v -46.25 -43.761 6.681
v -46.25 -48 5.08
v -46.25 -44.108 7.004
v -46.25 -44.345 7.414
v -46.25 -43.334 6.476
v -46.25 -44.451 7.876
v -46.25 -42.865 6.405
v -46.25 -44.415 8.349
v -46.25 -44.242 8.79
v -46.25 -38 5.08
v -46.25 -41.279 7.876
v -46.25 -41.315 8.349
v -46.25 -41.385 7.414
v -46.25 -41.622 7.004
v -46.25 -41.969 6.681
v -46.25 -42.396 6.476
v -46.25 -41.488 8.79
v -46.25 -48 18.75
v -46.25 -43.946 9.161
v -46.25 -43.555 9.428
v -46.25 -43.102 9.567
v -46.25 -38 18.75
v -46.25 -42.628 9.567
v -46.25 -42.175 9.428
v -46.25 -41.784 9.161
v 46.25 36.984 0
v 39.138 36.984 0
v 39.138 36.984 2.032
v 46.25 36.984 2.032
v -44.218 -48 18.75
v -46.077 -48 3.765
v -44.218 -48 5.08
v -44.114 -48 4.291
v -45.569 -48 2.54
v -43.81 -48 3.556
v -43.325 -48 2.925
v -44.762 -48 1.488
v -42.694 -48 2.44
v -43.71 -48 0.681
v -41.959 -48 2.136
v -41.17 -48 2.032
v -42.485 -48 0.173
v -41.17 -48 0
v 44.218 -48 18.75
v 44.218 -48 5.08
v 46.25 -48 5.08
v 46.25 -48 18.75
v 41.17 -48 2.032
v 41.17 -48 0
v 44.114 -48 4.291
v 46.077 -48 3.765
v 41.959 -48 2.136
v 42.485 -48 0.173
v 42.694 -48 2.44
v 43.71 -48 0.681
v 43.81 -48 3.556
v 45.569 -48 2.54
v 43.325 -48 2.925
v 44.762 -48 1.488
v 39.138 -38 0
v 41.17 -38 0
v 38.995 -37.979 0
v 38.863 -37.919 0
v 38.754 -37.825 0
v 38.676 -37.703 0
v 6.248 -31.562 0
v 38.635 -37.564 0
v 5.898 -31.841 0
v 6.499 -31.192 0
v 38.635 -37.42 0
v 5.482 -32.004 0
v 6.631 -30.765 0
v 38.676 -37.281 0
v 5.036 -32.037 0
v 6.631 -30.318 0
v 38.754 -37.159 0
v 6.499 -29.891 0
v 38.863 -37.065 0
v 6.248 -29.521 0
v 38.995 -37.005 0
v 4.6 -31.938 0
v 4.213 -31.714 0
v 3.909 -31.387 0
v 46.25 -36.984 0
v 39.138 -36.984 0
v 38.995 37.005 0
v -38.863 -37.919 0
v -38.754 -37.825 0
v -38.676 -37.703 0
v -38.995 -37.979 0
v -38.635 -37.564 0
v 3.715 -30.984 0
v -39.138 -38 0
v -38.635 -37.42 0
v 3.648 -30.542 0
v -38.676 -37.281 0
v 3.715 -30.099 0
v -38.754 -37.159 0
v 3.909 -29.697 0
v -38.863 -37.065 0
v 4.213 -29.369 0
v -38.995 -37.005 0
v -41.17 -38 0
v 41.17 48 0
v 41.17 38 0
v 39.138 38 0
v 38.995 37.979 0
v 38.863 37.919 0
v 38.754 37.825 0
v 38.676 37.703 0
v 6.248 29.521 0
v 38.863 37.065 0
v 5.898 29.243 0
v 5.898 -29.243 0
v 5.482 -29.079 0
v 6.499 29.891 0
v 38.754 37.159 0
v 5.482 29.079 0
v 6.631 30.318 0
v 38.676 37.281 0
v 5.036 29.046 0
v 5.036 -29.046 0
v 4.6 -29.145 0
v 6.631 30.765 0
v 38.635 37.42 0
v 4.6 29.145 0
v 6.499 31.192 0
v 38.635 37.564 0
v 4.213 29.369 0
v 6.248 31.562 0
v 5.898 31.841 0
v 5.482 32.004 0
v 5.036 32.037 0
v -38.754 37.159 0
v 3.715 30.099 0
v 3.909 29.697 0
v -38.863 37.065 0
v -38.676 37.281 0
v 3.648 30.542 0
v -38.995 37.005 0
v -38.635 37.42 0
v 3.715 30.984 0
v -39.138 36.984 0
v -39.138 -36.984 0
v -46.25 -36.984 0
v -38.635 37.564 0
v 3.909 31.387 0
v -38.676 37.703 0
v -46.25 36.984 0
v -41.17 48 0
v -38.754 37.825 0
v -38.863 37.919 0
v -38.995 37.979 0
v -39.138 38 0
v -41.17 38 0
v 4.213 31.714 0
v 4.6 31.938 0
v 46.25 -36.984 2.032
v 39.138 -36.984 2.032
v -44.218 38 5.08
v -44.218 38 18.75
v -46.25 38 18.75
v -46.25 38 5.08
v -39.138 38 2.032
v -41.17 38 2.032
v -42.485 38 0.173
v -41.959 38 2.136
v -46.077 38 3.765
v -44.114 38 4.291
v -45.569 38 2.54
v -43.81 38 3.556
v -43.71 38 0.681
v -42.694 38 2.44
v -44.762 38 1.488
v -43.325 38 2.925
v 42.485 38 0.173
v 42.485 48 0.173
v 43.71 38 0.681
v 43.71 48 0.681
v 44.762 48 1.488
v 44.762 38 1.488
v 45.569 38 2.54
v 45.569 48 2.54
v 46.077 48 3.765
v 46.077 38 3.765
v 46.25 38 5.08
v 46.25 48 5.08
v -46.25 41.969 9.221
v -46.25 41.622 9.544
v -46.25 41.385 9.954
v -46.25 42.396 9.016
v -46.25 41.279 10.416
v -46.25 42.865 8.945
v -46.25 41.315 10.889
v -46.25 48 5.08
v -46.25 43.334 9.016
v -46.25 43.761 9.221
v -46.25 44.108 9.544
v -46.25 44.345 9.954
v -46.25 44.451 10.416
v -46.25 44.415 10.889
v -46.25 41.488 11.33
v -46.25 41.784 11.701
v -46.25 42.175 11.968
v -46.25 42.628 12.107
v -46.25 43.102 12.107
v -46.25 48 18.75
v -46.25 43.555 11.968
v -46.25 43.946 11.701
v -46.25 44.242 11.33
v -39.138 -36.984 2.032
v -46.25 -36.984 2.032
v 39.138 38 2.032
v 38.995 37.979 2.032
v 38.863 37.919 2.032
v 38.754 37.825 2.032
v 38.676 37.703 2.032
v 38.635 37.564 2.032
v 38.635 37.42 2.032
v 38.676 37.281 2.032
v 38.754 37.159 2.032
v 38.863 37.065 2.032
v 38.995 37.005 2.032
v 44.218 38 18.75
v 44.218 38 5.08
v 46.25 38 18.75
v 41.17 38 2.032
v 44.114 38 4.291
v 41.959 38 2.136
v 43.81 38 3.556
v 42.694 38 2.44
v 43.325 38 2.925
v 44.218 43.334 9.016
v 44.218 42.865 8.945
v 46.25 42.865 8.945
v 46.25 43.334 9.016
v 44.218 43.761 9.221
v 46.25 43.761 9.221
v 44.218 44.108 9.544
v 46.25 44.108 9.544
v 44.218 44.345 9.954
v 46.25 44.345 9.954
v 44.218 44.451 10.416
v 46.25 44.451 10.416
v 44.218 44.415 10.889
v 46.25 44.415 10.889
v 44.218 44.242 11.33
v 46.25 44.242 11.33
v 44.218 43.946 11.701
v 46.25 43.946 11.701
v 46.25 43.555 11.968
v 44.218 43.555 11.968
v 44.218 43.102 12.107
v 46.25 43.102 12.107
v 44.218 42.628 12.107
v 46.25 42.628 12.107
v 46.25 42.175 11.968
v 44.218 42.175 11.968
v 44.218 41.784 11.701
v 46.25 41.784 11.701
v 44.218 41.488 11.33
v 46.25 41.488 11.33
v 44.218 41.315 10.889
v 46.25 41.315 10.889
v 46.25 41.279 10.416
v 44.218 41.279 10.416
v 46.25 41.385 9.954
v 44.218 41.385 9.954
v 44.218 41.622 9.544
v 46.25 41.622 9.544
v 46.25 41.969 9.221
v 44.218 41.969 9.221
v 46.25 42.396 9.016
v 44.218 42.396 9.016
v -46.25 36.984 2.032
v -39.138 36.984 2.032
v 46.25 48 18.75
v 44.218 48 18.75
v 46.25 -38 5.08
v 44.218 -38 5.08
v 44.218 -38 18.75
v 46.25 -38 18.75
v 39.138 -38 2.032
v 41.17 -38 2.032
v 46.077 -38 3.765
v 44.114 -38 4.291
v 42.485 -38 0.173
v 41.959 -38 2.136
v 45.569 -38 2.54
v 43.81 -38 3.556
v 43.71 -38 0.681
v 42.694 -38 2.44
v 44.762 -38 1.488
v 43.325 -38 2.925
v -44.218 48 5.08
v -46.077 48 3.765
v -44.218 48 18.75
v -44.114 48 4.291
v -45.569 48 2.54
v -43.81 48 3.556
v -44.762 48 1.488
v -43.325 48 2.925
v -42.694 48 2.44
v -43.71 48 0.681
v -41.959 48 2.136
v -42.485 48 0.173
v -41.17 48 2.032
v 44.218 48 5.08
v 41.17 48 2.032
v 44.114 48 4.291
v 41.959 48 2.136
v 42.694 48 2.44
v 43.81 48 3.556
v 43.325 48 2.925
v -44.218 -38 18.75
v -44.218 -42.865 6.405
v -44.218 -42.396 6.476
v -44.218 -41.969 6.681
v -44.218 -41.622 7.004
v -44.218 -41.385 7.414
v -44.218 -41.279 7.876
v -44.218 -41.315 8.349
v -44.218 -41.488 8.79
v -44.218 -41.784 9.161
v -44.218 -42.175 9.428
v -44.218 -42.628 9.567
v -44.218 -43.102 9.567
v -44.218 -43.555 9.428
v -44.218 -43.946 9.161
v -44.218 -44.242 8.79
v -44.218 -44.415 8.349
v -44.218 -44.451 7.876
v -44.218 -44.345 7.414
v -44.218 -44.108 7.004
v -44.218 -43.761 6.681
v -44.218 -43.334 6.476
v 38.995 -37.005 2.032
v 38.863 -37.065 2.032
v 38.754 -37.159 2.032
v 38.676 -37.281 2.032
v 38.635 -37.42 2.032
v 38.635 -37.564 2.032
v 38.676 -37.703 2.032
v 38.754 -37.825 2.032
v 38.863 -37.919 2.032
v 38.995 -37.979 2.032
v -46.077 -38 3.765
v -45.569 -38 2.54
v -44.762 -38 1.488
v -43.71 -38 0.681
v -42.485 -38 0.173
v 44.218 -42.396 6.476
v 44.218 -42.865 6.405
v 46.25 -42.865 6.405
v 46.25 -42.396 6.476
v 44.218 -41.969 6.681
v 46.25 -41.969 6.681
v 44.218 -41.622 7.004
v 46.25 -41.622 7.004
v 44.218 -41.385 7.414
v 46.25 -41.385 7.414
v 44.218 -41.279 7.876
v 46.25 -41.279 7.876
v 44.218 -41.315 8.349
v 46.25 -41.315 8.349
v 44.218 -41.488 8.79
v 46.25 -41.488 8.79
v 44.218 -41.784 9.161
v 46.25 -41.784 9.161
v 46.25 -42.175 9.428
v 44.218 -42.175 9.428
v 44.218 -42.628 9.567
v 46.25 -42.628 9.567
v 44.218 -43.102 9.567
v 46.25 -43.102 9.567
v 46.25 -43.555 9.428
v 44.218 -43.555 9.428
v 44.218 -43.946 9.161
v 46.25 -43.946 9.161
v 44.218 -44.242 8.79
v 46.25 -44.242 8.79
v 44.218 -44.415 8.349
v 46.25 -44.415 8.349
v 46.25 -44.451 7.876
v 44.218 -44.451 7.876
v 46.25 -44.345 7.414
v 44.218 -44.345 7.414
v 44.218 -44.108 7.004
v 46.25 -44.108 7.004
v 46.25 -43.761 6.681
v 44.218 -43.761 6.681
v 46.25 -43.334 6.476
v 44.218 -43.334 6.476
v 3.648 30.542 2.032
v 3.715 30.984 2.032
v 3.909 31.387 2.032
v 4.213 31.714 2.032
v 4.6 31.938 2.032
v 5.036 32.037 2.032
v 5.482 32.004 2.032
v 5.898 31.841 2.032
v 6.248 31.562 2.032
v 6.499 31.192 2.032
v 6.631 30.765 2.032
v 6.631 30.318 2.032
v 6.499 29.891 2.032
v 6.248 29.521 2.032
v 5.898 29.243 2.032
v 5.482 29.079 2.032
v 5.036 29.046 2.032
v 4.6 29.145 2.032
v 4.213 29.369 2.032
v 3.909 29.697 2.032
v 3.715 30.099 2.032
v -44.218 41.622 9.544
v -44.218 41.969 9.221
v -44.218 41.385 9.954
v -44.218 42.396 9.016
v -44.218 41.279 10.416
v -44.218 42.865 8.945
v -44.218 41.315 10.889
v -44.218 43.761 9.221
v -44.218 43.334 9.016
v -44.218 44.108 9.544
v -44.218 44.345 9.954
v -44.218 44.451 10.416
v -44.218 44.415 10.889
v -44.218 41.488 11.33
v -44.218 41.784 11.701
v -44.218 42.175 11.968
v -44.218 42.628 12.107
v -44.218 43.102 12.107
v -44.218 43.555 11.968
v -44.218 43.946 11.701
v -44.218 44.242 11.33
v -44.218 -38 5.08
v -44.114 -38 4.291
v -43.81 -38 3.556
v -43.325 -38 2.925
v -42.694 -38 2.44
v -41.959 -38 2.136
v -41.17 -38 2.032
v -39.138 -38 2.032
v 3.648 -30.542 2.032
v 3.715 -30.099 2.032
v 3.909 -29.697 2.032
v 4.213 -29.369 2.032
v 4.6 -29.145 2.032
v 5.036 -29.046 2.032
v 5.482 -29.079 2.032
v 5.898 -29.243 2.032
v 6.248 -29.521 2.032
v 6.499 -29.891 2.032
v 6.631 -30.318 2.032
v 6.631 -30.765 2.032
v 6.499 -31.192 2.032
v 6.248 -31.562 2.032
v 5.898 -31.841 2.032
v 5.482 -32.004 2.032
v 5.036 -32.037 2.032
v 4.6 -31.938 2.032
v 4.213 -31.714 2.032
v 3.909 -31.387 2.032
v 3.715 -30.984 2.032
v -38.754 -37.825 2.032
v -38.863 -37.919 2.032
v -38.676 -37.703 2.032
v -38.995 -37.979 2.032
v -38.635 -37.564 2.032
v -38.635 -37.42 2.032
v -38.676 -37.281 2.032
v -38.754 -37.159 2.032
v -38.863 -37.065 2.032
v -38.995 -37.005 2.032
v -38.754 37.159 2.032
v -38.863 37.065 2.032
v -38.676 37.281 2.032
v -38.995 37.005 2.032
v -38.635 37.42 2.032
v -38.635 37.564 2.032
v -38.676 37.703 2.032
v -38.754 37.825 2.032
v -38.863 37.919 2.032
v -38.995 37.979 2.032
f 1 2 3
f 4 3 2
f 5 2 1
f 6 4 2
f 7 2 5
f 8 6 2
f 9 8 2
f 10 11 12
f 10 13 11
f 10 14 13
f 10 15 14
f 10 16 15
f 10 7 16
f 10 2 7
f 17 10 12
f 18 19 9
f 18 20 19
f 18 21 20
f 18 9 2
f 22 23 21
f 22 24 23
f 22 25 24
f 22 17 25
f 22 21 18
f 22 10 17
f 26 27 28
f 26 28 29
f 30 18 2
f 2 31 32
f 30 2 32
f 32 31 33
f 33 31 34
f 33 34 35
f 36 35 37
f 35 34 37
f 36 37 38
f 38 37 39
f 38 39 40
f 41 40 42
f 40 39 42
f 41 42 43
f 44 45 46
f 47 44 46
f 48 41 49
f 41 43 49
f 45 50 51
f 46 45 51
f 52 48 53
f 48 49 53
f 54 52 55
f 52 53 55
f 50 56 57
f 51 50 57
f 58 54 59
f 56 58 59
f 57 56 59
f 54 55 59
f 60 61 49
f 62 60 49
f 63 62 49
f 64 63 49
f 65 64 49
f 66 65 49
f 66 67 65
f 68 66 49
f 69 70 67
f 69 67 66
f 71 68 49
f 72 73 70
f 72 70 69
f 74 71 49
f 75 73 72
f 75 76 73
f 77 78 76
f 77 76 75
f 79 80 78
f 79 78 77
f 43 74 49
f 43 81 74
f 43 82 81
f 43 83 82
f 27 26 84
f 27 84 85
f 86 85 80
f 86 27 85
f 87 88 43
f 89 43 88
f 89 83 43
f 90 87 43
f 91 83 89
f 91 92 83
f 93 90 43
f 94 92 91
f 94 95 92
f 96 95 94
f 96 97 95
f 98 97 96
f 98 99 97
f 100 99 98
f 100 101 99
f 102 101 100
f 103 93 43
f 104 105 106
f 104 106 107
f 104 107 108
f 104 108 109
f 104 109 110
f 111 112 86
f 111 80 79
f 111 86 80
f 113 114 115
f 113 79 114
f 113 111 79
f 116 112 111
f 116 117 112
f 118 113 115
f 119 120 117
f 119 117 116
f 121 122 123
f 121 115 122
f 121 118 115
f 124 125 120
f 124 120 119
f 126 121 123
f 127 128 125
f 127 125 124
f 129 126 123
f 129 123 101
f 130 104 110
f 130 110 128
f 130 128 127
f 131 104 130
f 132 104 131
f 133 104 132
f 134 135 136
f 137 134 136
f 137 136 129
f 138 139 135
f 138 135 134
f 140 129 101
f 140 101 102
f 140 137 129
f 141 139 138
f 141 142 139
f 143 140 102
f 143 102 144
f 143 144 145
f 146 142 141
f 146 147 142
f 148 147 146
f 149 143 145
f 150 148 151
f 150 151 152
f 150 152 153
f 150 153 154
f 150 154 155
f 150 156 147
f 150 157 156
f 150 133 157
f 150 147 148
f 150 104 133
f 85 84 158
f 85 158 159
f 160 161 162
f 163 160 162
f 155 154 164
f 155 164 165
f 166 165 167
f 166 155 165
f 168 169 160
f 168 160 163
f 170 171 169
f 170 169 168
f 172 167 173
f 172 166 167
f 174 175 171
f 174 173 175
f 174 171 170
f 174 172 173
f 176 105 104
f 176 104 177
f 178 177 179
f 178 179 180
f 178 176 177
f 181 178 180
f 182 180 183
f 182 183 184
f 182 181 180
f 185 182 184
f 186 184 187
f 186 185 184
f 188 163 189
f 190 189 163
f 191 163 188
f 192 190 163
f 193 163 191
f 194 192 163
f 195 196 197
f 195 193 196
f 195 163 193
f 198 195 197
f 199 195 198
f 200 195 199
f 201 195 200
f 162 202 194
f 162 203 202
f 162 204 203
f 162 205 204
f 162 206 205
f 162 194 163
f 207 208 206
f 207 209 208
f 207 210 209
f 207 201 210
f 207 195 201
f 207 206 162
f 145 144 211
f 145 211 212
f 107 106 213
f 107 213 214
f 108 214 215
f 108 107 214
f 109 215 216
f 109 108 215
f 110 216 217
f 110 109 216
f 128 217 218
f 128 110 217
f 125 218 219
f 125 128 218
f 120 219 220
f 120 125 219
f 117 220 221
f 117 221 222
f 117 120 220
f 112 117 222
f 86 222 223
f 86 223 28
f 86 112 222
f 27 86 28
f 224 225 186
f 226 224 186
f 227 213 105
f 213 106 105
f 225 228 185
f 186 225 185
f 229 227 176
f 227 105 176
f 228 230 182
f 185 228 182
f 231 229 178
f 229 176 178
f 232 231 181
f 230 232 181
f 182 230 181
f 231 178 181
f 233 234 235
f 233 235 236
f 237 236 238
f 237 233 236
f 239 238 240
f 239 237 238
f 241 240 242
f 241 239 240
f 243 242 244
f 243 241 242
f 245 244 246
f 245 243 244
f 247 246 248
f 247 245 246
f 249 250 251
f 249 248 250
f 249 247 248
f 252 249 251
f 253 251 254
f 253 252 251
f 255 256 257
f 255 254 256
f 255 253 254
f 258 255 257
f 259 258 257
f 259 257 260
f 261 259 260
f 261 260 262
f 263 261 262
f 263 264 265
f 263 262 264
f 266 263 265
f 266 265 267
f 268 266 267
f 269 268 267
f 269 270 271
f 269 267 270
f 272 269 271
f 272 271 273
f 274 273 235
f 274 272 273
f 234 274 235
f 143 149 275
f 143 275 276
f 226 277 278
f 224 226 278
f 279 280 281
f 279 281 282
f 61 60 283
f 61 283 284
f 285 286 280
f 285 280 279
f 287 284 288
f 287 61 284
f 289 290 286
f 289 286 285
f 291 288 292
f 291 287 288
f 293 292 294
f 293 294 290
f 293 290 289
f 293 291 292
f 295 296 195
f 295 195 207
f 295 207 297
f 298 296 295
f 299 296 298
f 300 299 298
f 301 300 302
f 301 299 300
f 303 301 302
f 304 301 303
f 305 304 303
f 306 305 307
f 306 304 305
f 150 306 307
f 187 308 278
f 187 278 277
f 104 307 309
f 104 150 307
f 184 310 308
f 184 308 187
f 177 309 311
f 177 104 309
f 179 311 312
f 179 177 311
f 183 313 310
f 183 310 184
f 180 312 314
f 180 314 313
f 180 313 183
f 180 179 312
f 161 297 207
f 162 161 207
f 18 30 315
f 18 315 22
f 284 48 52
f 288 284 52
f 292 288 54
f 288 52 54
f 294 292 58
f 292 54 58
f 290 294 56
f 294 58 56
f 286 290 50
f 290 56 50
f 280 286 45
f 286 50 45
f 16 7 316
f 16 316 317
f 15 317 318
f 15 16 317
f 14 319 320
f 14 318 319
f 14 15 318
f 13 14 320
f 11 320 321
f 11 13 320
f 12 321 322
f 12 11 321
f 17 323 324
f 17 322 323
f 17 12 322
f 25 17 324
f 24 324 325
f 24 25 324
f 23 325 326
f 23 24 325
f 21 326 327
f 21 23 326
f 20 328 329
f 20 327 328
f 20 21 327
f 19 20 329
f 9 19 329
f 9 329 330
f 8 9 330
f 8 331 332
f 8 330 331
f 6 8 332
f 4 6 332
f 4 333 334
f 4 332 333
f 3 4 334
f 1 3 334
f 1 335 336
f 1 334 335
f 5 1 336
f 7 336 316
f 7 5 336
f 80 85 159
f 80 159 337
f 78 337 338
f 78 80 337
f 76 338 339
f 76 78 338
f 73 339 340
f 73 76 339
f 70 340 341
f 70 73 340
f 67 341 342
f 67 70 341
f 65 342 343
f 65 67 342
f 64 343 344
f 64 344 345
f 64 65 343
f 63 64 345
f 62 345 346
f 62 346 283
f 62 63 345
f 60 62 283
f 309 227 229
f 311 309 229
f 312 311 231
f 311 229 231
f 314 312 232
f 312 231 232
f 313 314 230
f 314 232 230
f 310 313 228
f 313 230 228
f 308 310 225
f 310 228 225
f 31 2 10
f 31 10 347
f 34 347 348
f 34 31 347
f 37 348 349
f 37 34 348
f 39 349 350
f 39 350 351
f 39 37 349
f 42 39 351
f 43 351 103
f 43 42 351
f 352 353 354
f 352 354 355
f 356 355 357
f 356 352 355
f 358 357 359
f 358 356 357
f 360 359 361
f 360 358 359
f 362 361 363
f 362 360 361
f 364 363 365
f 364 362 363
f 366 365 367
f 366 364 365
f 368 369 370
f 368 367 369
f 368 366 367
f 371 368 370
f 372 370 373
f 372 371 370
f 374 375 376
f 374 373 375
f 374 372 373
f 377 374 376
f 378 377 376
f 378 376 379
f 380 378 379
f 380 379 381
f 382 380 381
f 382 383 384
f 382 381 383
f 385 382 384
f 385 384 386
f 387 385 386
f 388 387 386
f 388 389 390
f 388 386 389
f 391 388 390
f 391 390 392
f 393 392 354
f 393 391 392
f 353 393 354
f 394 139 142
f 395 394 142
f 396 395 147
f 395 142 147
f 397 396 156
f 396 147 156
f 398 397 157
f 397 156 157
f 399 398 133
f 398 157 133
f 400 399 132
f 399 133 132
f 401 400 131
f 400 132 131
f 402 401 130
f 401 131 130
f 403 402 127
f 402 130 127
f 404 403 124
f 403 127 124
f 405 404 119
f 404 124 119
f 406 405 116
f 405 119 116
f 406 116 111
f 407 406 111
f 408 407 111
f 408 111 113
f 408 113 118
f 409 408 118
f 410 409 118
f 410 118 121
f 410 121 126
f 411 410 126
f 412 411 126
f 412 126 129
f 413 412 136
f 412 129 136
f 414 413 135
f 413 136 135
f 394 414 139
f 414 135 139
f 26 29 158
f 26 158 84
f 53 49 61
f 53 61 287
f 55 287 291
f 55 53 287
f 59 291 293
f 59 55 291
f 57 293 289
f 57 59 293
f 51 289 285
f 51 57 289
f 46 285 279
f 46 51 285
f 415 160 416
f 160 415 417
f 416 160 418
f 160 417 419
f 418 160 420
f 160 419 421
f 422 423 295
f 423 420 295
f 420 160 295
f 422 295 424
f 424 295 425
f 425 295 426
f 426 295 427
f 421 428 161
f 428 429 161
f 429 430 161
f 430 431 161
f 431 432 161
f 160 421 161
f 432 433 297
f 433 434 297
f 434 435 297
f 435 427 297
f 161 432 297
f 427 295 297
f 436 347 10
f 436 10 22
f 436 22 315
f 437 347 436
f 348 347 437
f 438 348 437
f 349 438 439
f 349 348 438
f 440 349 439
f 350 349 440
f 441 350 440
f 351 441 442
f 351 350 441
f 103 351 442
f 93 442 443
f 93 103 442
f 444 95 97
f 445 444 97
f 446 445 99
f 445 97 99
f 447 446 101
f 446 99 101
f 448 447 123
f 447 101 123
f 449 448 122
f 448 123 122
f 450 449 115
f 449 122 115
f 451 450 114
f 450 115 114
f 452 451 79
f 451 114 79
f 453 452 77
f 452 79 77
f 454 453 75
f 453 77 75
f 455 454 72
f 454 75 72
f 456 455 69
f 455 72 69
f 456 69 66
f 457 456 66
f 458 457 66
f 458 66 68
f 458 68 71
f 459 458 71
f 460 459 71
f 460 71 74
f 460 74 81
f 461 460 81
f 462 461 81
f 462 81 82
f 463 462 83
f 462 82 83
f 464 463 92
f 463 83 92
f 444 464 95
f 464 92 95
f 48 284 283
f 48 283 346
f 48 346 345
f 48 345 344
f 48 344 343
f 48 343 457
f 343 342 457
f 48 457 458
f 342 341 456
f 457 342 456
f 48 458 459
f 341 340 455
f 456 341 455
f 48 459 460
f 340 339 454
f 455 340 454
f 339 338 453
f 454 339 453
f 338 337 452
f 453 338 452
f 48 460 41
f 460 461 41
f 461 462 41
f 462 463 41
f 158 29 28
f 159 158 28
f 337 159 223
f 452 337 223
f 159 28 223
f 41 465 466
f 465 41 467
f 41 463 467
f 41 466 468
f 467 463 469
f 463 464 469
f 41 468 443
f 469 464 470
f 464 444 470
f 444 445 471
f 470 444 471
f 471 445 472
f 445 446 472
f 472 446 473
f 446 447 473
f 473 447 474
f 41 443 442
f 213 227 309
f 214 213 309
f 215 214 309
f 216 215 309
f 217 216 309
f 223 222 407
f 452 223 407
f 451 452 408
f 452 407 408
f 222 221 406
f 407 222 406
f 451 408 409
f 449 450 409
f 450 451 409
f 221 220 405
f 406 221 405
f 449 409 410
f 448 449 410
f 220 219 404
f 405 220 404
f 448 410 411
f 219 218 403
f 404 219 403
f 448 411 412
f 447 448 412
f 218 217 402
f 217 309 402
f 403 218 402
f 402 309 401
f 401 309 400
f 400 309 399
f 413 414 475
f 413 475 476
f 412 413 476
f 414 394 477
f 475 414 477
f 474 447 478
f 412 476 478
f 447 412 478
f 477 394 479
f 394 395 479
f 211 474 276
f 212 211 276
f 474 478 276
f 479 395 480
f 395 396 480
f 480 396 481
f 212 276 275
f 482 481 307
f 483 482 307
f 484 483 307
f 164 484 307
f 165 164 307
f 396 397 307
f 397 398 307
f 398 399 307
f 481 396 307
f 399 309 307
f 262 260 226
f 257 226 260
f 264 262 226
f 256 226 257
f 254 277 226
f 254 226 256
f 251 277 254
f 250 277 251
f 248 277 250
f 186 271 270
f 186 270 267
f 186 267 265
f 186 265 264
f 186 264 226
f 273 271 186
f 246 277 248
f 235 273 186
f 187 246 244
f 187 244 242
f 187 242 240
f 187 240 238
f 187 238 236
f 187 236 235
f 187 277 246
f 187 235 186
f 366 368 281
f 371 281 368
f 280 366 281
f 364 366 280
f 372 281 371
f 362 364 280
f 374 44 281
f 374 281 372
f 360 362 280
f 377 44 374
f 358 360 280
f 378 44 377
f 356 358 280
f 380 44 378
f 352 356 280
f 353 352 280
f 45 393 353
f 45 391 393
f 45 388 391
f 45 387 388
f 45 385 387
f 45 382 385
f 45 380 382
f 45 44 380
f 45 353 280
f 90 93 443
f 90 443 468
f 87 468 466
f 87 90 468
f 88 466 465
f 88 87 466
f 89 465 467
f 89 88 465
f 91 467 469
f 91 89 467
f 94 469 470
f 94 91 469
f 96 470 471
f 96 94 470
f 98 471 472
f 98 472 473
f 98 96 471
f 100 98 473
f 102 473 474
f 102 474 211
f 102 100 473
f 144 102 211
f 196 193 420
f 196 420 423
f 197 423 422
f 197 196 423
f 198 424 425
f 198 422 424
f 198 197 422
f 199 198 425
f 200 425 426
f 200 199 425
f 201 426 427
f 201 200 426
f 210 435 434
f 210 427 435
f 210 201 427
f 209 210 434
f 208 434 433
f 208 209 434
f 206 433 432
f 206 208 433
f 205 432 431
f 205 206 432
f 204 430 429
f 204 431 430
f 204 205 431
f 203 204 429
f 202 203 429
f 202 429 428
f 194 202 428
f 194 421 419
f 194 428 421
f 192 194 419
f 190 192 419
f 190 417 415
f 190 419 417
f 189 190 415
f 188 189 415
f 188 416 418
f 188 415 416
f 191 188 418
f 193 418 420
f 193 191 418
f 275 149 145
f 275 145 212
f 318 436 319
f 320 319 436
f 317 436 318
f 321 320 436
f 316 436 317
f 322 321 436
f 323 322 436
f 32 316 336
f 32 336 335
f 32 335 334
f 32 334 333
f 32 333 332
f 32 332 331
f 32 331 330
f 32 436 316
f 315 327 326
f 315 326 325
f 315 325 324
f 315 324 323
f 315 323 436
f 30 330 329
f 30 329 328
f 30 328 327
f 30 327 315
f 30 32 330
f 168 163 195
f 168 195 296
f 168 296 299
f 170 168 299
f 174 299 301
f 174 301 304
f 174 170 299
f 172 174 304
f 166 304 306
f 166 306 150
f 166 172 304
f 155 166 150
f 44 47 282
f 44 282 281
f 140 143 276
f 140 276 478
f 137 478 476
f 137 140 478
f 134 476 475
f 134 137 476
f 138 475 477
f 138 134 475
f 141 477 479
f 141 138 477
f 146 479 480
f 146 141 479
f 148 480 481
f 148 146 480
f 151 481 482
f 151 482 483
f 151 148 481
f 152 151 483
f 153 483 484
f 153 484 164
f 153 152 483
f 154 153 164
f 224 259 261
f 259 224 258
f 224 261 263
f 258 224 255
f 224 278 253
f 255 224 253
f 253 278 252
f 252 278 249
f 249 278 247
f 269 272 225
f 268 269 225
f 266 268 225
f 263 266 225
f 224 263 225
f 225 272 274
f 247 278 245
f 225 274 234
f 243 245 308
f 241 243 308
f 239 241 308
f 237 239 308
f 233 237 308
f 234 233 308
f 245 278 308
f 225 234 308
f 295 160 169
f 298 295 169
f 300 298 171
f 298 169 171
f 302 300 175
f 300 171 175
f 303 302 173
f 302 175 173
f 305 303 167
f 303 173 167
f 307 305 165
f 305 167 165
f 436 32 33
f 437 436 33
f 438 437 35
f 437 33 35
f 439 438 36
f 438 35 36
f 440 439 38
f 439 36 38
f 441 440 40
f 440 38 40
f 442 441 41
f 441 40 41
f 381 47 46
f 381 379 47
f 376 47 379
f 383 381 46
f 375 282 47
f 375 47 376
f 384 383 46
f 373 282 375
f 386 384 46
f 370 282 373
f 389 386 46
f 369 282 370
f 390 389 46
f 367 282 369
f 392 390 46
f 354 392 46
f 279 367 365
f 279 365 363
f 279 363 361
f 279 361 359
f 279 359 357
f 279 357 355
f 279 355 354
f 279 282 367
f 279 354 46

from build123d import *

# Parameters (mm, degrees)
BOSS_EXTRUDE1_DEPTH     = 48
BOSS_EXTRUDE2_START     = 48
BOSS_EXTRUDE2_DEPTH     = 10
BOSS_EXTRUDE3_START     = -48
BOSS_EXTRUDE3_DEPTH     = 10
CONVERT_SOLID1_START    = -48
CONVERT_SOLID1_DEPTH    = 10
CONVERT_SOLID1_START_2  = 38
CONVERT_SOLID1_2_DEPTH  = 10
CONVERT_SOLID1_3_DEPTH  = 2.032
CONVERT_SOLID1_4_DEPTH  = 11.016
CONVERT_SOLID1_START_3  = 36.984
CONVERT_SOLID1_5_DEPTH  = 11.016
CUT_EXTRUDE1_DEPTH      = 70.243230716
CUT_EXTRUDE1_DEPTH_BACK = 70.243230716
SKETCH6_R               = 1.59
SKETCH7_R               = 1.5
CUT_EXTRUDE3_DEPTH      = 2.032


# Read off the part's stored shape, not the designer's step: Convert-Solid1
with BuildPart() as part:
    # Sketch1 → Boss-Extrude1 (new, symmetric)
    with BuildSketch(Plane(origin=(0, 0, 0), x_dir=(1, 0, 0), z_dir=(0, 1, 0))):
        Polygon((-44.218, 0), (-46.25, 0), (-46.25, -2.032), (-44.218, -2.032), (44.218, -2.032), (46.25, -2.032), (46.25, 0), (44.218, 0), align=None)
    extrude(amount=BOSS_EXTRUDE1_DEPTH, both=True)

    # Sketch1<3> → Boss-Extrude2 (add)
    with BuildSketch(Plane(origin=(0, 0, 0), x_dir=(1, 0, 0), z_dir=(0, 1, 0)).offset(BOSS_EXTRUDE2_START)):
        Polygon((-46.25, 0), (46.25, 0), (46.25, -18.75), (44.218, -18.75), (44.218, -2.032), (-44.218, -2.032), (-44.218, -18.75), (-46.25, -18.75), align=None)
    extrude(amount=-BOSS_EXTRUDE2_DEPTH)

    # Sketch1<4> → Boss-Extrude3 (add)
    with BuildSketch(Plane(origin=(0, 0, 0), x_dir=(1, 0, 0), z_dir=(0, 1, 0)).offset(BOSS_EXTRUDE3_START)):
        Polygon((-46.25, 0), (46.25, 0), (46.25, -18.75), (44.218, -18.75), (44.218, -2.032), (-44.218, -2.032), (-44.218, -18.75), (-46.25, -18.75), align=None)
    extrude(amount=BOSS_EXTRUDE3_DEPTH)

    # Convert-Solid1 outline → Convert-Solid1 (add)
    with BuildSketch(Plane(origin=(0, 0, 0), x_dir=(1, 0, 0), z_dir=(0, 1, 0)).offset(CONVERT_SOLID1_START)):
        with BuildLine():
            ThreePointArc((41.17, -2.032), (43.325261469, -2.924738531), (44.218, -5.08))
            Line((44.218, -5.08), (44.218, -2.032))
            Line((44.218, -2.032), (41.17, -2.032))
        make_face()
        with BuildLine():
            ThreePointArc((-44.218, -5.08), (-43.325261469, -2.924738531), (-41.17, -2.032))
            Line((-41.17, -2.032), (-44.218, -2.032))
            Line((-44.218, -2.032), (-44.218, -5.08))
        make_face()
    extrude(amount=CONVERT_SOLID1_DEPTH)

    # Convert-Solid1 2 outline → Convert-Solid1 2 (add)
    with BuildSketch(Plane(origin=(0, 0, 0), x_dir=(1, 0, 0), z_dir=(0, 1, 0)).offset(CONVERT_SOLID1_START_2)):
        with BuildLine():
            ThreePointArc((41.17, -2.032), (43.325261469, -2.924738531), (44.218, -5.08))
            Line((44.218, -5.08), (44.218, -2.032))
            Line((44.218, -2.032), (41.17, -2.032))
        make_face()
        with BuildLine():
            ThreePointArc((-44.218, -5.08), (-43.325261469, -2.924738531), (-41.17, -2.032))
            Line((-41.17, -2.032), (-44.218, -2.032))
            Line((-44.218, -2.032), (-44.218, -5.08))
        make_face()
    extrude(amount=CONVERT_SOLID1_2_DEPTH)

    # Convert-Solid1 3 outline → Convert-Solid1 3 (cut)
    with BuildSketch(Plane.XY):
        with BuildLine():
            ThreePointArc((39.138, -36.984), (38.63, -37.492), (39.138, -38))
            Line((39.138, -38), (46.25, -38))
            Line((46.25, -38), (46.25, -36.984))
            Line((46.25, -36.984), (39.138, -36.984))
        make_face()
        with BuildLine():
            Line((39.138, 36.984), (46.25, 36.984))
            Line((46.25, 36.984), (46.25, 38))
            Line((46.25, 38), (39.138, 38))
            ThreePointArc((39.138, 38), (38.63, 37.492), (39.138, 36.984))
        make_face()
        with BuildLine():
            Line((-46.25, -36.984), (-46.25, -38))
            Line((-46.25, -38), (-39.138, -38))
            ThreePointArc((-39.138, -38), (-38.63, -37.492), (-39.138, -36.984))
            Line((-39.138, -36.984), (-46.25, -36.984))
        make_face()
        with BuildLine():
            Line((-39.138, 38), (-46.25, 38))
            Line((-46.25, 38), (-46.25, 36.984))
            Line((-46.25, 36.984), (-39.138, 36.984))
            ThreePointArc((-39.138, 36.984), (-38.63, 37.492), (-39.138, 38))
        make_face()
    extrude(amount=CONVERT_SOLID1_3_DEPTH, mode=Mode.SUBTRACT)

    # Convert-Solid1 4 outline → Convert-Solid1 4 (cut)
    with BuildSketch(Plane(origin=(0, 0, 0), x_dir=(1, 0, 0), z_dir=(0, 1, 0)).offset(CONVERT_SOLID1_START)):
        with BuildLine():
            Line((46.25, -5.08), (46.25, 0))
            Line((46.25, 0), (41.17, 0))
            ThreePointArc((41.17, 0), (44.762102448, -1.487897552), (46.25, -5.08))
        make_face()
        with BuildLine():
            Line((-46.25, 0), (-46.25, -5.08))
            ThreePointArc((-46.25, -5.08), (-44.762102448, -1.487897552), (-41.17, 0))
            Line((-41.17, 0), (-46.25, 0))
        make_face()
    extrude(amount=CONVERT_SOLID1_4_DEPTH, mode=Mode.SUBTRACT)

    # Convert-Solid1 5 outline → Convert-Solid1 5 (cut)
    with BuildSketch(Plane(origin=(0, 0, 0), x_dir=(1, 0, 0), z_dir=(0, 1, 0)).offset(CONVERT_SOLID1_START_3)):
        with BuildLine():
            Line((46.25, -5.08), (46.25, 0))
            Line((46.25, 0), (41.17, 0))
            ThreePointArc((41.17, 0), (44.762102448, -1.487897552), (46.25, -5.08))
        make_face()
        with BuildLine():
            Line((-46.25, 0), (-46.25, -5.08))
            ThreePointArc((-46.25, -5.08), (-44.762102448, -1.487897552), (-41.17, 0))
            Line((-41.17, 0), (-46.25, 0))
        make_face()
    extrude(amount=CONVERT_SOLID1_5_DEPTH, mode=Mode.SUBTRACT)

    # Sketch6 → Cut-Extrude1 (cut, two sides: drawn at the far end of the back side and taken through both)
    with BuildSketch(Plane(origin=(0, 0, 0), x_dir=(0, 0, -1), z_dir=(1, 0, 0)).offset(-CUT_EXTRUDE1_DEPTH_BACK)):
        with Locations((-10.535, 42.865)):
            Circle(SKETCH6_R)
        with Locations((-7.995, -42.865)):
            Circle(SKETCH6_R)
    extrude(amount=CUT_EXTRUDE1_DEPTH + CUT_EXTRUDE1_DEPTH_BACK, mode=Mode.SUBTRACT)

    # Sketch7 → Cut-Extrude3 (cut)
    with BuildSketch(Plane(origin=(0, 0, 0), x_dir=(-1, 0, 0), z_dir=(0, 0, -1))):
        with Locations((-5.148, 30.54163056)):
            Circle(SKETCH7_R)
        with Locations((-5.148, -30.54163056)):
            Circle(SKETCH7_R)
    extrude(amount=-CUT_EXTRUDE3_DEPTH, mode=Mode.SUBTRACT)


solid = part.part
